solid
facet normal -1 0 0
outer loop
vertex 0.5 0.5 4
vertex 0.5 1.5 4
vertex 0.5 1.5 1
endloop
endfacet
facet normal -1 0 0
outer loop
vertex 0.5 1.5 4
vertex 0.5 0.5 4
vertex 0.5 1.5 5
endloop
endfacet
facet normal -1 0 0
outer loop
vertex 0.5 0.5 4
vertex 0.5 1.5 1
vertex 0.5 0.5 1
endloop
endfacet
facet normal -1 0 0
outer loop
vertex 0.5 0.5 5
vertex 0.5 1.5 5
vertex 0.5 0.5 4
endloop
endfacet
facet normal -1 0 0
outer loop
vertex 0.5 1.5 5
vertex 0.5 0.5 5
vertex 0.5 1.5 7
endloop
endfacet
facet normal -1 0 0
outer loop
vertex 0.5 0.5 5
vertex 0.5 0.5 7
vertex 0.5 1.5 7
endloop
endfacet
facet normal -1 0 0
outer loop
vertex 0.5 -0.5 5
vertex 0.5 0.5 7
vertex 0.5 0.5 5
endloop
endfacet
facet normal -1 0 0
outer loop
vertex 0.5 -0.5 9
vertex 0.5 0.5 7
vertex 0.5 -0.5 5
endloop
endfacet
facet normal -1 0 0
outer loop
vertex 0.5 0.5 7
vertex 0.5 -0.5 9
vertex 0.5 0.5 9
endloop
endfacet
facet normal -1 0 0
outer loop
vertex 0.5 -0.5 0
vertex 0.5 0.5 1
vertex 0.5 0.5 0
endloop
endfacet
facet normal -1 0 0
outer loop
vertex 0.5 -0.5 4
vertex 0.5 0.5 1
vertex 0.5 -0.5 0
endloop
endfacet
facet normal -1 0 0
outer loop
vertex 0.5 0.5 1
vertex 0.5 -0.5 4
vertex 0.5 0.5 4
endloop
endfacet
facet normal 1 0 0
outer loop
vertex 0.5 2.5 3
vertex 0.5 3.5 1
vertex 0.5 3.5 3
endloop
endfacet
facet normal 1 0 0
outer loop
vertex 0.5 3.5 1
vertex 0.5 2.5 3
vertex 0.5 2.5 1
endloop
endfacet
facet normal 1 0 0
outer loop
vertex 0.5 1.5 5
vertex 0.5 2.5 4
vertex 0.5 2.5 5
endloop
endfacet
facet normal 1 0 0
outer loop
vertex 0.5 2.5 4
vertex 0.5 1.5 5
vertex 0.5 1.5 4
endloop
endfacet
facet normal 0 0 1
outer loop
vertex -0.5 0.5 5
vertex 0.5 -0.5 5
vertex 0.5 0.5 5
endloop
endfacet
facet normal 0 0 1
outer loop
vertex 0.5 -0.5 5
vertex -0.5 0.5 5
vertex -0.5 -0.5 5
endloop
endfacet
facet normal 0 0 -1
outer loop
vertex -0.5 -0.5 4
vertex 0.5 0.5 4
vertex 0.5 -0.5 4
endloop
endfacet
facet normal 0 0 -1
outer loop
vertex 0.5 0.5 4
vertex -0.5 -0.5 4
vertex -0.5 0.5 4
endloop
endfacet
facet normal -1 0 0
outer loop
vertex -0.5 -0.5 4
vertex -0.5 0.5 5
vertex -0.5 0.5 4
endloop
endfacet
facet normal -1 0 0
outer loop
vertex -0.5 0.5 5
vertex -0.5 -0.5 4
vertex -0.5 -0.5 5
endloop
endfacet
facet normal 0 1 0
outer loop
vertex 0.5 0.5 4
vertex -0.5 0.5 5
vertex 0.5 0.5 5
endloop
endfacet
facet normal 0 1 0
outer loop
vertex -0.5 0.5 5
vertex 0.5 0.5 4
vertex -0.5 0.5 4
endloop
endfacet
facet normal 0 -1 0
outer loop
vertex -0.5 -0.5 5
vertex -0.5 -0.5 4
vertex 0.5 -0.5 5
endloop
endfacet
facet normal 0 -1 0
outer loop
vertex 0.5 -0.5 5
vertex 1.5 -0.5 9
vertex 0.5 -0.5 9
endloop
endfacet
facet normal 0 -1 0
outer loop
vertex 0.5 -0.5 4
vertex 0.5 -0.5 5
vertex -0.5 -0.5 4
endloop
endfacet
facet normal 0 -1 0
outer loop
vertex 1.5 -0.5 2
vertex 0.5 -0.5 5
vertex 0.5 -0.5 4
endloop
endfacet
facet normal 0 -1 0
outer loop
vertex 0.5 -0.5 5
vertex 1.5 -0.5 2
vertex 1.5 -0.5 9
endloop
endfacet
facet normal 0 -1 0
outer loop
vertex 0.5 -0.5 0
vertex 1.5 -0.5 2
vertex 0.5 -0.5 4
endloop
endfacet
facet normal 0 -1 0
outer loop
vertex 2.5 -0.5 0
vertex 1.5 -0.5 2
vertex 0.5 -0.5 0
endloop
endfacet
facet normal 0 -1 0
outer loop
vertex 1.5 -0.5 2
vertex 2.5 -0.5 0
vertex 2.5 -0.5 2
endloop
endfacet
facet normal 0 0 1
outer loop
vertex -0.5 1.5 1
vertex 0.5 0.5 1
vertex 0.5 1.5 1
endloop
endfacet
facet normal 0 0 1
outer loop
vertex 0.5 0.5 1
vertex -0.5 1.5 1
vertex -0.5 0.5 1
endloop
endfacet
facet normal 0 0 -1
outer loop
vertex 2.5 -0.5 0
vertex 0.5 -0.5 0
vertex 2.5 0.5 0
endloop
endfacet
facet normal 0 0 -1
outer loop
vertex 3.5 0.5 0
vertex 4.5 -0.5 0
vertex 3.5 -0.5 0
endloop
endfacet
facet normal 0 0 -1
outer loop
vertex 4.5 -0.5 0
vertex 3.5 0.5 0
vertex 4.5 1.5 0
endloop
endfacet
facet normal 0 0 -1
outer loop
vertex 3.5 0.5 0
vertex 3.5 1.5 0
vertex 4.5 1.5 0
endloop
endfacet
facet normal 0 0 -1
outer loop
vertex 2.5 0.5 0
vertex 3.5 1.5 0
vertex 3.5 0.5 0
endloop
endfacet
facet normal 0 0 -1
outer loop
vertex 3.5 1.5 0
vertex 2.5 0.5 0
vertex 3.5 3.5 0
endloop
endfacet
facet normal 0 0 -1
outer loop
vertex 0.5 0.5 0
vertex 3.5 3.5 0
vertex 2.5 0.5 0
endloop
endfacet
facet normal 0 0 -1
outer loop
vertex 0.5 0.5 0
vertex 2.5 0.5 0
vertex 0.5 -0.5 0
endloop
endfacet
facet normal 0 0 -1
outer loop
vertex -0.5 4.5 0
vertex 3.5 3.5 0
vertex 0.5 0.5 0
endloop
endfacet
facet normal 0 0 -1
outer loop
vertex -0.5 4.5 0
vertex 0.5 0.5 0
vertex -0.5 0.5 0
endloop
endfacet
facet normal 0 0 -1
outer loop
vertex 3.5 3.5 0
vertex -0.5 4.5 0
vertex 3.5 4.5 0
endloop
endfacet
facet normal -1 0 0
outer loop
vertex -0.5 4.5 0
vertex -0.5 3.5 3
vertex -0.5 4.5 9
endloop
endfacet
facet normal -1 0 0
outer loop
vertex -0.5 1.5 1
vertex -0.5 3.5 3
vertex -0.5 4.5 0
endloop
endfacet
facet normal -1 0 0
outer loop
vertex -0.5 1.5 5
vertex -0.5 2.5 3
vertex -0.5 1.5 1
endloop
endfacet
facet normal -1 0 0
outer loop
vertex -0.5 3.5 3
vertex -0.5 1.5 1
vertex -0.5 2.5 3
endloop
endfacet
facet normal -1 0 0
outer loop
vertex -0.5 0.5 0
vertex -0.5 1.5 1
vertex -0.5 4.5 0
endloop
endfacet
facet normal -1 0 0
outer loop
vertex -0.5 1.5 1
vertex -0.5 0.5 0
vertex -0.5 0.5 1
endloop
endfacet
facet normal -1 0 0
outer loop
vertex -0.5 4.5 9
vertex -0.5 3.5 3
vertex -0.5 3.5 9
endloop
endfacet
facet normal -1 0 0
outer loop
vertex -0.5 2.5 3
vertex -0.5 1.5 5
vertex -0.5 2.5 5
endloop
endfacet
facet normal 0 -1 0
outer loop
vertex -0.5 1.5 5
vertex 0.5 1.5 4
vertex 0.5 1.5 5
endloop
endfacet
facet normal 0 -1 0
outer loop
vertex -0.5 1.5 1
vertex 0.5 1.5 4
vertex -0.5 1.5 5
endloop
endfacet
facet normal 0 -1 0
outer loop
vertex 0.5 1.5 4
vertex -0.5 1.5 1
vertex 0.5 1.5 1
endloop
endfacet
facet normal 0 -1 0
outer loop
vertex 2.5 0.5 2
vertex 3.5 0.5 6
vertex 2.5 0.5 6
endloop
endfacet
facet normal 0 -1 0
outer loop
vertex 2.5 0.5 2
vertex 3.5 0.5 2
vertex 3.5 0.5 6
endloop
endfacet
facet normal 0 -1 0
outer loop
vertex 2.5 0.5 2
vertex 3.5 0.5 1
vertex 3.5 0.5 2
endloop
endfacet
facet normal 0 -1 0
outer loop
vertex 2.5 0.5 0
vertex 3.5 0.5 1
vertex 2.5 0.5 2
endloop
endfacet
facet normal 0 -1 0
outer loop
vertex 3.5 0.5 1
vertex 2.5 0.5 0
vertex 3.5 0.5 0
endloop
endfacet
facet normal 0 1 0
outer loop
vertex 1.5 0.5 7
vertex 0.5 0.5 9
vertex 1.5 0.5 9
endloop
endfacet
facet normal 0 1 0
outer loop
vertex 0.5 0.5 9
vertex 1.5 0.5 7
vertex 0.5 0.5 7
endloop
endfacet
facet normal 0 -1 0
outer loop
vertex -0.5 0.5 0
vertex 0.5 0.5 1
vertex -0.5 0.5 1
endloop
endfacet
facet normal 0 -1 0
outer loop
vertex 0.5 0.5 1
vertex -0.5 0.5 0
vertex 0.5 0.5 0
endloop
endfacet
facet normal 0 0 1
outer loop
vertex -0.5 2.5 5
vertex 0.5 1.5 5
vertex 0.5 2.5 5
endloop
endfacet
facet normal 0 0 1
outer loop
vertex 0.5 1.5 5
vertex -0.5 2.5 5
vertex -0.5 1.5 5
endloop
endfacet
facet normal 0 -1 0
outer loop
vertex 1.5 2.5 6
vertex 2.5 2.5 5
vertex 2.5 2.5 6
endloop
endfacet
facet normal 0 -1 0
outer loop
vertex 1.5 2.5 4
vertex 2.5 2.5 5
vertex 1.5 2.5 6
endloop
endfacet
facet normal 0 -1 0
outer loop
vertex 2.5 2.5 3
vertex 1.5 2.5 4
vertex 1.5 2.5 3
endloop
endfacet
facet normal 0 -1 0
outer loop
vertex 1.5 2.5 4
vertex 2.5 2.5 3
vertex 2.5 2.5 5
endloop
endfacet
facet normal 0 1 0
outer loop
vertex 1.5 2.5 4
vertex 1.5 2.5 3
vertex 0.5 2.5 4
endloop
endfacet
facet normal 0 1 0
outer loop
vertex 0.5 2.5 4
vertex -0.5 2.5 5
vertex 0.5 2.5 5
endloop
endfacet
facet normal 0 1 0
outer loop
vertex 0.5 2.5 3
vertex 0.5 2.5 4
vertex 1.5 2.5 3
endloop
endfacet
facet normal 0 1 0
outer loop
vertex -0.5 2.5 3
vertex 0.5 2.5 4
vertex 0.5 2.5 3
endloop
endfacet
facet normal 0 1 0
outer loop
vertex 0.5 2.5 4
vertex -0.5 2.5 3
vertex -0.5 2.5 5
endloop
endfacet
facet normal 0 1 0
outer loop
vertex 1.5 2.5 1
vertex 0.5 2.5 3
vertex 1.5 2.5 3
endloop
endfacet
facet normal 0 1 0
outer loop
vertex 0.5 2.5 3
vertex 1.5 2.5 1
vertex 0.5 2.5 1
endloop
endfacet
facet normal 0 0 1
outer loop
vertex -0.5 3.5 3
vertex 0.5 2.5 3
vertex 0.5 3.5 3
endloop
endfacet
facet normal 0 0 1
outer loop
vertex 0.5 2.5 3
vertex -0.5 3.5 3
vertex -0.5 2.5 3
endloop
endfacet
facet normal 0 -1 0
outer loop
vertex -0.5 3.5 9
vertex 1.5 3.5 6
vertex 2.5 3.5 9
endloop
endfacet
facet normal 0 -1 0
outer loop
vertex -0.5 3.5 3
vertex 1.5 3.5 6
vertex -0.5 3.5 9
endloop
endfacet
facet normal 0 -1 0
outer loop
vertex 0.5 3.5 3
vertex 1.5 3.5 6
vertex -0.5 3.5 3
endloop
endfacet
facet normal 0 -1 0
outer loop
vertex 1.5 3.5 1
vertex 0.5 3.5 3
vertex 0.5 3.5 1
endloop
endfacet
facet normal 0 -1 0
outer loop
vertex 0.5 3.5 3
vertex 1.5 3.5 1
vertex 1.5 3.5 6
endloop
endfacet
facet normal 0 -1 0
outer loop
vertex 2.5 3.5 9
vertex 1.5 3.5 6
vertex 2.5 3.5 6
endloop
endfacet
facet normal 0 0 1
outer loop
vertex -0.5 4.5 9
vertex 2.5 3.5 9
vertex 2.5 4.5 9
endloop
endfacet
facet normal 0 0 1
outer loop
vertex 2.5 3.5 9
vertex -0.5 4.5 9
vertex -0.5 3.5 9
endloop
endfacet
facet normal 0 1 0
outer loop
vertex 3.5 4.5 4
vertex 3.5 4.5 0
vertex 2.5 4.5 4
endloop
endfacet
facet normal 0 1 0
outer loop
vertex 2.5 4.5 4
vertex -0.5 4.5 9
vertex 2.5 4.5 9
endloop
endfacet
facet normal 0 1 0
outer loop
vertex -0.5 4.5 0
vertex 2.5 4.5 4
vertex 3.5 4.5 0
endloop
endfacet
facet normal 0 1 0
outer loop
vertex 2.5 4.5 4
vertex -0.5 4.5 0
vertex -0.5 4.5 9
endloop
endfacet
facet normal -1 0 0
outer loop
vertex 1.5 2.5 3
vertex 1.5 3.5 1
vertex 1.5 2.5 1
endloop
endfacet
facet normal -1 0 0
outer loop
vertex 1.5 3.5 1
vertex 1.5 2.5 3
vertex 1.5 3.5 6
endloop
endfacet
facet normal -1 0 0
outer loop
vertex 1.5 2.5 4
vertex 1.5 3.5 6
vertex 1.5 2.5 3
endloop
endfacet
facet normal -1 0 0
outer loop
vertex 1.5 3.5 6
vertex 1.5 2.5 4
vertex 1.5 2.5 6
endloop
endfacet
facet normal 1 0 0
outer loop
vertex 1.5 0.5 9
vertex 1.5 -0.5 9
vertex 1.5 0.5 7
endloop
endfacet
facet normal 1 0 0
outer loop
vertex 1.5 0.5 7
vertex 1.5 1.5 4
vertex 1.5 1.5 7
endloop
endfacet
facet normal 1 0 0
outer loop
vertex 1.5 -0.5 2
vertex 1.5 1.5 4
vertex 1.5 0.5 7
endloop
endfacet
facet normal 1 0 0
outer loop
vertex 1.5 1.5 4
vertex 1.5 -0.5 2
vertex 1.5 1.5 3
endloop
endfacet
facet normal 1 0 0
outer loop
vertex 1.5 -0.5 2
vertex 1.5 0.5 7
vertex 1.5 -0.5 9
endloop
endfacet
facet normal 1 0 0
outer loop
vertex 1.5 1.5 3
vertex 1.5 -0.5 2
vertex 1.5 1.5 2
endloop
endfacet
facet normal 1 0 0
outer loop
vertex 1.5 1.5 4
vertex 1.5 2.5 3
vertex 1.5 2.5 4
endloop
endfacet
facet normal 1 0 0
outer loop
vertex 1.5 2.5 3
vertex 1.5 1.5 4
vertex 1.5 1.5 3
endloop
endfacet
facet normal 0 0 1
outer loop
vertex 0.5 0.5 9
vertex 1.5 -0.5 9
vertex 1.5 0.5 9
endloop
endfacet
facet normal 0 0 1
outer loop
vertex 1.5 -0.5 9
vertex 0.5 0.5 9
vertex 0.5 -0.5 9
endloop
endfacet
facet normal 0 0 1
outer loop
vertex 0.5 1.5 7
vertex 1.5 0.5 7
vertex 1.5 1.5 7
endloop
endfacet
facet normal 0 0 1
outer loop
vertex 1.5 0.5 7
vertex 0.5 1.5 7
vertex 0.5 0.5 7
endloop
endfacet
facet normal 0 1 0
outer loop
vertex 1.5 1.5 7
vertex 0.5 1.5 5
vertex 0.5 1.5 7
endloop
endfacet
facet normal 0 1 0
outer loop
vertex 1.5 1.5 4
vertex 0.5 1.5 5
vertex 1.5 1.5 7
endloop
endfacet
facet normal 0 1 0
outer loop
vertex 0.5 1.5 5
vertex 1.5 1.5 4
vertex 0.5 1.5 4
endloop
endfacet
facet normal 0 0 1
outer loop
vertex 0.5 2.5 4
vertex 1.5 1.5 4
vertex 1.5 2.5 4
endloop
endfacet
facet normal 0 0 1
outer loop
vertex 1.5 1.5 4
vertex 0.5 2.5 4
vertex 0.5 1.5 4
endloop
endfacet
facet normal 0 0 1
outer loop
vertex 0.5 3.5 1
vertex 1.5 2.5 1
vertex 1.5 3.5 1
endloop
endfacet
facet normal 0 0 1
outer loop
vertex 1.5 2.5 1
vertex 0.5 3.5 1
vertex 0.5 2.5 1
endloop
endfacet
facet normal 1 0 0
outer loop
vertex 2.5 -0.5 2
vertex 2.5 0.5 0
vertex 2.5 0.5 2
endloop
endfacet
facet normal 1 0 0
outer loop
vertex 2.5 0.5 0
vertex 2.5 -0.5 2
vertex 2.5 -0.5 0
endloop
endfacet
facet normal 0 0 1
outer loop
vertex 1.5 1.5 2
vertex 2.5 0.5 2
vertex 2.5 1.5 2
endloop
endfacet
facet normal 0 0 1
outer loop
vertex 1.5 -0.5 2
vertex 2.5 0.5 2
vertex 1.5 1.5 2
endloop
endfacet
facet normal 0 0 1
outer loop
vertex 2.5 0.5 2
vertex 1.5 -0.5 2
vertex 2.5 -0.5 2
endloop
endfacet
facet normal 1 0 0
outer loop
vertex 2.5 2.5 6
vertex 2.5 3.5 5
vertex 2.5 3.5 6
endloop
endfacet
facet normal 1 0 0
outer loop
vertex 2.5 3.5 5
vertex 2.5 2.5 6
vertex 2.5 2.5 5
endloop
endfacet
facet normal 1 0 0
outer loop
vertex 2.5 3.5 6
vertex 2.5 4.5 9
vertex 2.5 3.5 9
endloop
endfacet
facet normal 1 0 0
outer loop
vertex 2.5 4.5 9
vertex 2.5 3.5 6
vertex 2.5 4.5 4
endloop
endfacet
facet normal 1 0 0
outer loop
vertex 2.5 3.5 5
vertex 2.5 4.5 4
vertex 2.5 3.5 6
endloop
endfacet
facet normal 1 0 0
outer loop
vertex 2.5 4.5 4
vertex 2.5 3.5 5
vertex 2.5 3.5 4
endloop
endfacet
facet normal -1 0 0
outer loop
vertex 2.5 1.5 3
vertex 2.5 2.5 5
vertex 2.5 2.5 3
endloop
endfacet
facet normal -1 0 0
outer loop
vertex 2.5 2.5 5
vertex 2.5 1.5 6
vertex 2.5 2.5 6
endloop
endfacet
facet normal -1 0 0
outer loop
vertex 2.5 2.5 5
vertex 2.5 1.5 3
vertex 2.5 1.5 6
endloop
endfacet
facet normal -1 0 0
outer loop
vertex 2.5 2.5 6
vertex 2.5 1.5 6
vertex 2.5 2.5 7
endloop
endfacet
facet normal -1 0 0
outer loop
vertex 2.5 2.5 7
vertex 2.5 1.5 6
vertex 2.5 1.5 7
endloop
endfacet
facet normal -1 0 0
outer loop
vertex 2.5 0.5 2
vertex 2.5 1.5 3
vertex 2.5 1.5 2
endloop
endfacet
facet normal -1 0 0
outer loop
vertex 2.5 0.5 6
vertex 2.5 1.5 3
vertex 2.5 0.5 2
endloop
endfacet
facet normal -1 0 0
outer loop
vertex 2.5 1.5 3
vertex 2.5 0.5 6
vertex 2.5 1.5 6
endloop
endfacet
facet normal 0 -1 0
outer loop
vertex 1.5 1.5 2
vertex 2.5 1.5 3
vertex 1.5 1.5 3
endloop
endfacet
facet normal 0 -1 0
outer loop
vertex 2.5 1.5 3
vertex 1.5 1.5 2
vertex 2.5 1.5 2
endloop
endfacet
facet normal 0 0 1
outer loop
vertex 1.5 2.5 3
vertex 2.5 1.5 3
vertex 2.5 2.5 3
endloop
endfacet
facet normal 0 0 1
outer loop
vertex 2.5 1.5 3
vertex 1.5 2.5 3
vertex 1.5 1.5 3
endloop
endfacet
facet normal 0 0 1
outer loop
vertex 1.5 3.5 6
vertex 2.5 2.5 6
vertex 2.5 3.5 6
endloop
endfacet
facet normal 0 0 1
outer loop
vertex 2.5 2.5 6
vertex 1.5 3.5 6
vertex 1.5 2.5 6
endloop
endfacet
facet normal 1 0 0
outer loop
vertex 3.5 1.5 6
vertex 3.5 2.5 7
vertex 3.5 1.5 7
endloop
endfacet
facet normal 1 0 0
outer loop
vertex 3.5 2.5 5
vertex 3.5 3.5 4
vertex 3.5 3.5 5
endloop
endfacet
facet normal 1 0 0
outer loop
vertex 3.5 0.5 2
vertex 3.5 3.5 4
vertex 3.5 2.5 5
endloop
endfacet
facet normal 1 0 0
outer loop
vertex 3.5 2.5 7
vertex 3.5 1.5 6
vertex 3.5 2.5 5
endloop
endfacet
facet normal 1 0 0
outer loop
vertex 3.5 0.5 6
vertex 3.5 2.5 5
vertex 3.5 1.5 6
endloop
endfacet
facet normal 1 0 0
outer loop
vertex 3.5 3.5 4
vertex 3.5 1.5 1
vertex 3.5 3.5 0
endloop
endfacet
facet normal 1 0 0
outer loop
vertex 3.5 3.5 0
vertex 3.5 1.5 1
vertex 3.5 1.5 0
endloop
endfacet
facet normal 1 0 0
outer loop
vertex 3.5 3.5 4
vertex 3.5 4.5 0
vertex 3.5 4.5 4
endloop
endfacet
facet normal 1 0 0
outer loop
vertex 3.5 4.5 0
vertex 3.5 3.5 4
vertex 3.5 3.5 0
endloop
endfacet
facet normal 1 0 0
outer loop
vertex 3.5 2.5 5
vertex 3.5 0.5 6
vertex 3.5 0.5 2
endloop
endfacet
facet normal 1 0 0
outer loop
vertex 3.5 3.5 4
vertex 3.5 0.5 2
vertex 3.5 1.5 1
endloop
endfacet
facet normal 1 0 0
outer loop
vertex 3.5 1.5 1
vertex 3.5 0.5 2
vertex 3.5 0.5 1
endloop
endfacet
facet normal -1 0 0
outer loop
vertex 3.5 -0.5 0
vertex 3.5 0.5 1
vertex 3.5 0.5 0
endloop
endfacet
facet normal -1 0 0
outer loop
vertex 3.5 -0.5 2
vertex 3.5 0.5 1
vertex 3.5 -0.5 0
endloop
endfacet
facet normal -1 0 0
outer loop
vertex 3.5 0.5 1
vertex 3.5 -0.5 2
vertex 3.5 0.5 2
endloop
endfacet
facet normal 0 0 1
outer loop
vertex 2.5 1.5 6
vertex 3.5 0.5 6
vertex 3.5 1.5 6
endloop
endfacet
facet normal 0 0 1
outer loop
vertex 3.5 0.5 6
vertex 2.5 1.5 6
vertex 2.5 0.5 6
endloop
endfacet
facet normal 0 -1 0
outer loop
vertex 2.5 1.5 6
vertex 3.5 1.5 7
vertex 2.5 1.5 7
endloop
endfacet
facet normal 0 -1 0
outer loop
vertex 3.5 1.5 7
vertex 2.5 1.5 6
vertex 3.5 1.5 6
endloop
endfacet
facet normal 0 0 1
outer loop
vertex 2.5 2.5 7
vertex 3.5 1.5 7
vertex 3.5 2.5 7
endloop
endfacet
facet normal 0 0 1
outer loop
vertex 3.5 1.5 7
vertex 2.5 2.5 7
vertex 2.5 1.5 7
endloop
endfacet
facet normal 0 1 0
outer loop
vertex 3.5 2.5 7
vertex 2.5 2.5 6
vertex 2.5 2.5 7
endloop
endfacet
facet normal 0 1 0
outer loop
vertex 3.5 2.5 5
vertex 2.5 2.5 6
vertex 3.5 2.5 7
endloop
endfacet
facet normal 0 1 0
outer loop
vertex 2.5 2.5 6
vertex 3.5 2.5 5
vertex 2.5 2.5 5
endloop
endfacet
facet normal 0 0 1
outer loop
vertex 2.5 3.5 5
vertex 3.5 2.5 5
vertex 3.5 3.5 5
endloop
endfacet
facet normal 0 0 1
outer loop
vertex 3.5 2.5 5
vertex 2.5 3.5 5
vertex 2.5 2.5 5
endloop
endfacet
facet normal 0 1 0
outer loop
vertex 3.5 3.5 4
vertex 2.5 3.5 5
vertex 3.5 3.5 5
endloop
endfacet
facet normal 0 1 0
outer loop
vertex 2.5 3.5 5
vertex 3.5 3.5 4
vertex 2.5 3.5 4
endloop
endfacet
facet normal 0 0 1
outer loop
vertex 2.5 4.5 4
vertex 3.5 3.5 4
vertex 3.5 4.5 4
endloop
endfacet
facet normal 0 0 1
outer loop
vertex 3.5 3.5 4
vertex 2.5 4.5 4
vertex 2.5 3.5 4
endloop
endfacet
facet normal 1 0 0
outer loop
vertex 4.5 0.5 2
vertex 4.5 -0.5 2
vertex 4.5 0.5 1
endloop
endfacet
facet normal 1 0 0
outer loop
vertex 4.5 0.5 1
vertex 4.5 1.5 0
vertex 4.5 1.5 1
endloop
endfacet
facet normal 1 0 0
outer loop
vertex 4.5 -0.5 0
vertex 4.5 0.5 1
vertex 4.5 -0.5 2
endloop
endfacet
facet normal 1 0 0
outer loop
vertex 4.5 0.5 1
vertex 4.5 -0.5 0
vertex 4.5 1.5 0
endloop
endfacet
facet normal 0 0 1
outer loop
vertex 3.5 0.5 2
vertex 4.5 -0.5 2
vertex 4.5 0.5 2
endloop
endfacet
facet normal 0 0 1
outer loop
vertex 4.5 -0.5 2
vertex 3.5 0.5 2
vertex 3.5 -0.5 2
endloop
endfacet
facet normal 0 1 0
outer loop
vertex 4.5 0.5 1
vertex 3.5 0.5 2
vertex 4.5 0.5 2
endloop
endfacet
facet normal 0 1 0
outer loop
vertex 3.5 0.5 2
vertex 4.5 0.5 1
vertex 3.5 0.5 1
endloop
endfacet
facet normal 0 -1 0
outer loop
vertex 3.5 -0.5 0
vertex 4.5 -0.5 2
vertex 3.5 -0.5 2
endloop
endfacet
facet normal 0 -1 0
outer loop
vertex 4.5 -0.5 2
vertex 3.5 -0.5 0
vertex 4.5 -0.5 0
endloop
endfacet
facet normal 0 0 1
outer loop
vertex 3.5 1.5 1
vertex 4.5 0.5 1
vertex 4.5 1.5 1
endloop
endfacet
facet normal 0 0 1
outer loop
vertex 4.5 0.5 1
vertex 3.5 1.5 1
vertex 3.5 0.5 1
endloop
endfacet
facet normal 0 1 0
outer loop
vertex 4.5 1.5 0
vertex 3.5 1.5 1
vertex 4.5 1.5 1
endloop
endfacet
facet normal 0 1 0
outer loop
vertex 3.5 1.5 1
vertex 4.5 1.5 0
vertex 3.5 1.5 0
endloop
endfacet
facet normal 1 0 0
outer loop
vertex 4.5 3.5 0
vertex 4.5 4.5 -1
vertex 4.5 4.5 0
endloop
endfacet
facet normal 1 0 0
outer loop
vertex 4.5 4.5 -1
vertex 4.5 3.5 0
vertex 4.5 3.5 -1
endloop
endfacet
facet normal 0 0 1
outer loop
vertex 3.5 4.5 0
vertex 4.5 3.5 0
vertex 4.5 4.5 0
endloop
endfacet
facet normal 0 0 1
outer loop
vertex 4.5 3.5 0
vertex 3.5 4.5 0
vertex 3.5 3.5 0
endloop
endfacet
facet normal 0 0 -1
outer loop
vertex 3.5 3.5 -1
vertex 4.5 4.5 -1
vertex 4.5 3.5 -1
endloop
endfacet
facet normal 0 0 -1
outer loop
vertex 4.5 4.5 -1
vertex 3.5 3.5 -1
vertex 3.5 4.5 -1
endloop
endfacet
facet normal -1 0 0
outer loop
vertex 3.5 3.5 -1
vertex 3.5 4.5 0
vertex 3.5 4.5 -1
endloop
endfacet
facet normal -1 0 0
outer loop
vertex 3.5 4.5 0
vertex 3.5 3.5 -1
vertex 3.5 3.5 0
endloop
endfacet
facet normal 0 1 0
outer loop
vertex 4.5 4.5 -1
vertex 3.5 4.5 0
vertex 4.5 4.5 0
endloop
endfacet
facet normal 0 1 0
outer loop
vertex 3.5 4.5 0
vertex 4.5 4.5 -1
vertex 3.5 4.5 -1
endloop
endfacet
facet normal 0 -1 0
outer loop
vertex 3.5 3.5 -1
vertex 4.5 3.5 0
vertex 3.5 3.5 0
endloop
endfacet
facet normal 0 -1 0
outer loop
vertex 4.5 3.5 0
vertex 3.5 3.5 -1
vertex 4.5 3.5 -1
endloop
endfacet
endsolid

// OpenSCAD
union() {
    translate([0, 0, 4.5]) color([1, 0, 0]) cube([1, 1, 1], center=true);
    translate([0, 1, 0.5]) cube([1, 1, 1], center=true);
    translate([0, 2, 2.5]) cube([1, 1, 5], center=true);
    translate([0, 3, 1.5]) cube([1, 1, 3], center=true);
    translate([0, 4, 4.5]) cube([1, 1, 9], center=true);
    translate([1, 0, 4.5]) cube([1, 1, 9], center=true);
    translate([1, 1, 3.5]) cube([1, 1, 7], center=true);
    translate([1, 2, 2.0]) cube([1, 1, 4], center=true);
    translate([1, 3, 0.5]) cube([1, 1, 1], center=true);
    translate([1, 4, 4.5]) cube([1, 1, 9], center=true);
    translate([2, 0, 1.0]) cube([1, 1, 2], center=true);
    translate([2, 1, 1.0]) cube([1, 1, 2], center=true);
    translate([2, 2, 1.5]) cube([1, 1, 3], center=true);
    translate([2, 3, 3.0]) cube([1, 1, 6], center=true);
    translate([2, 4, 4.5]) cube([1, 1, 9], center=true);
    translate([3, 1, 3.0]) cube([1, 1, 6], center=true);
    translate([3, 2, 3.5]) cube([1, 1, 7], center=true);
    translate([3, 3, 2.5]) cube([1, 1, 5], center=true);
    translate([3, 4, 2.0]) cube([1, 1, 4], center=true);
    translate([4, 0, 1.0]) cube([1, 1, 2], center=true);
    translate([4, 1, 0.5]) cube([1, 1, 1], center=true);
    translate([4, 4, -0.5]) color([0, 0, 1]) cube([1, 1, 1], center=true);
}
